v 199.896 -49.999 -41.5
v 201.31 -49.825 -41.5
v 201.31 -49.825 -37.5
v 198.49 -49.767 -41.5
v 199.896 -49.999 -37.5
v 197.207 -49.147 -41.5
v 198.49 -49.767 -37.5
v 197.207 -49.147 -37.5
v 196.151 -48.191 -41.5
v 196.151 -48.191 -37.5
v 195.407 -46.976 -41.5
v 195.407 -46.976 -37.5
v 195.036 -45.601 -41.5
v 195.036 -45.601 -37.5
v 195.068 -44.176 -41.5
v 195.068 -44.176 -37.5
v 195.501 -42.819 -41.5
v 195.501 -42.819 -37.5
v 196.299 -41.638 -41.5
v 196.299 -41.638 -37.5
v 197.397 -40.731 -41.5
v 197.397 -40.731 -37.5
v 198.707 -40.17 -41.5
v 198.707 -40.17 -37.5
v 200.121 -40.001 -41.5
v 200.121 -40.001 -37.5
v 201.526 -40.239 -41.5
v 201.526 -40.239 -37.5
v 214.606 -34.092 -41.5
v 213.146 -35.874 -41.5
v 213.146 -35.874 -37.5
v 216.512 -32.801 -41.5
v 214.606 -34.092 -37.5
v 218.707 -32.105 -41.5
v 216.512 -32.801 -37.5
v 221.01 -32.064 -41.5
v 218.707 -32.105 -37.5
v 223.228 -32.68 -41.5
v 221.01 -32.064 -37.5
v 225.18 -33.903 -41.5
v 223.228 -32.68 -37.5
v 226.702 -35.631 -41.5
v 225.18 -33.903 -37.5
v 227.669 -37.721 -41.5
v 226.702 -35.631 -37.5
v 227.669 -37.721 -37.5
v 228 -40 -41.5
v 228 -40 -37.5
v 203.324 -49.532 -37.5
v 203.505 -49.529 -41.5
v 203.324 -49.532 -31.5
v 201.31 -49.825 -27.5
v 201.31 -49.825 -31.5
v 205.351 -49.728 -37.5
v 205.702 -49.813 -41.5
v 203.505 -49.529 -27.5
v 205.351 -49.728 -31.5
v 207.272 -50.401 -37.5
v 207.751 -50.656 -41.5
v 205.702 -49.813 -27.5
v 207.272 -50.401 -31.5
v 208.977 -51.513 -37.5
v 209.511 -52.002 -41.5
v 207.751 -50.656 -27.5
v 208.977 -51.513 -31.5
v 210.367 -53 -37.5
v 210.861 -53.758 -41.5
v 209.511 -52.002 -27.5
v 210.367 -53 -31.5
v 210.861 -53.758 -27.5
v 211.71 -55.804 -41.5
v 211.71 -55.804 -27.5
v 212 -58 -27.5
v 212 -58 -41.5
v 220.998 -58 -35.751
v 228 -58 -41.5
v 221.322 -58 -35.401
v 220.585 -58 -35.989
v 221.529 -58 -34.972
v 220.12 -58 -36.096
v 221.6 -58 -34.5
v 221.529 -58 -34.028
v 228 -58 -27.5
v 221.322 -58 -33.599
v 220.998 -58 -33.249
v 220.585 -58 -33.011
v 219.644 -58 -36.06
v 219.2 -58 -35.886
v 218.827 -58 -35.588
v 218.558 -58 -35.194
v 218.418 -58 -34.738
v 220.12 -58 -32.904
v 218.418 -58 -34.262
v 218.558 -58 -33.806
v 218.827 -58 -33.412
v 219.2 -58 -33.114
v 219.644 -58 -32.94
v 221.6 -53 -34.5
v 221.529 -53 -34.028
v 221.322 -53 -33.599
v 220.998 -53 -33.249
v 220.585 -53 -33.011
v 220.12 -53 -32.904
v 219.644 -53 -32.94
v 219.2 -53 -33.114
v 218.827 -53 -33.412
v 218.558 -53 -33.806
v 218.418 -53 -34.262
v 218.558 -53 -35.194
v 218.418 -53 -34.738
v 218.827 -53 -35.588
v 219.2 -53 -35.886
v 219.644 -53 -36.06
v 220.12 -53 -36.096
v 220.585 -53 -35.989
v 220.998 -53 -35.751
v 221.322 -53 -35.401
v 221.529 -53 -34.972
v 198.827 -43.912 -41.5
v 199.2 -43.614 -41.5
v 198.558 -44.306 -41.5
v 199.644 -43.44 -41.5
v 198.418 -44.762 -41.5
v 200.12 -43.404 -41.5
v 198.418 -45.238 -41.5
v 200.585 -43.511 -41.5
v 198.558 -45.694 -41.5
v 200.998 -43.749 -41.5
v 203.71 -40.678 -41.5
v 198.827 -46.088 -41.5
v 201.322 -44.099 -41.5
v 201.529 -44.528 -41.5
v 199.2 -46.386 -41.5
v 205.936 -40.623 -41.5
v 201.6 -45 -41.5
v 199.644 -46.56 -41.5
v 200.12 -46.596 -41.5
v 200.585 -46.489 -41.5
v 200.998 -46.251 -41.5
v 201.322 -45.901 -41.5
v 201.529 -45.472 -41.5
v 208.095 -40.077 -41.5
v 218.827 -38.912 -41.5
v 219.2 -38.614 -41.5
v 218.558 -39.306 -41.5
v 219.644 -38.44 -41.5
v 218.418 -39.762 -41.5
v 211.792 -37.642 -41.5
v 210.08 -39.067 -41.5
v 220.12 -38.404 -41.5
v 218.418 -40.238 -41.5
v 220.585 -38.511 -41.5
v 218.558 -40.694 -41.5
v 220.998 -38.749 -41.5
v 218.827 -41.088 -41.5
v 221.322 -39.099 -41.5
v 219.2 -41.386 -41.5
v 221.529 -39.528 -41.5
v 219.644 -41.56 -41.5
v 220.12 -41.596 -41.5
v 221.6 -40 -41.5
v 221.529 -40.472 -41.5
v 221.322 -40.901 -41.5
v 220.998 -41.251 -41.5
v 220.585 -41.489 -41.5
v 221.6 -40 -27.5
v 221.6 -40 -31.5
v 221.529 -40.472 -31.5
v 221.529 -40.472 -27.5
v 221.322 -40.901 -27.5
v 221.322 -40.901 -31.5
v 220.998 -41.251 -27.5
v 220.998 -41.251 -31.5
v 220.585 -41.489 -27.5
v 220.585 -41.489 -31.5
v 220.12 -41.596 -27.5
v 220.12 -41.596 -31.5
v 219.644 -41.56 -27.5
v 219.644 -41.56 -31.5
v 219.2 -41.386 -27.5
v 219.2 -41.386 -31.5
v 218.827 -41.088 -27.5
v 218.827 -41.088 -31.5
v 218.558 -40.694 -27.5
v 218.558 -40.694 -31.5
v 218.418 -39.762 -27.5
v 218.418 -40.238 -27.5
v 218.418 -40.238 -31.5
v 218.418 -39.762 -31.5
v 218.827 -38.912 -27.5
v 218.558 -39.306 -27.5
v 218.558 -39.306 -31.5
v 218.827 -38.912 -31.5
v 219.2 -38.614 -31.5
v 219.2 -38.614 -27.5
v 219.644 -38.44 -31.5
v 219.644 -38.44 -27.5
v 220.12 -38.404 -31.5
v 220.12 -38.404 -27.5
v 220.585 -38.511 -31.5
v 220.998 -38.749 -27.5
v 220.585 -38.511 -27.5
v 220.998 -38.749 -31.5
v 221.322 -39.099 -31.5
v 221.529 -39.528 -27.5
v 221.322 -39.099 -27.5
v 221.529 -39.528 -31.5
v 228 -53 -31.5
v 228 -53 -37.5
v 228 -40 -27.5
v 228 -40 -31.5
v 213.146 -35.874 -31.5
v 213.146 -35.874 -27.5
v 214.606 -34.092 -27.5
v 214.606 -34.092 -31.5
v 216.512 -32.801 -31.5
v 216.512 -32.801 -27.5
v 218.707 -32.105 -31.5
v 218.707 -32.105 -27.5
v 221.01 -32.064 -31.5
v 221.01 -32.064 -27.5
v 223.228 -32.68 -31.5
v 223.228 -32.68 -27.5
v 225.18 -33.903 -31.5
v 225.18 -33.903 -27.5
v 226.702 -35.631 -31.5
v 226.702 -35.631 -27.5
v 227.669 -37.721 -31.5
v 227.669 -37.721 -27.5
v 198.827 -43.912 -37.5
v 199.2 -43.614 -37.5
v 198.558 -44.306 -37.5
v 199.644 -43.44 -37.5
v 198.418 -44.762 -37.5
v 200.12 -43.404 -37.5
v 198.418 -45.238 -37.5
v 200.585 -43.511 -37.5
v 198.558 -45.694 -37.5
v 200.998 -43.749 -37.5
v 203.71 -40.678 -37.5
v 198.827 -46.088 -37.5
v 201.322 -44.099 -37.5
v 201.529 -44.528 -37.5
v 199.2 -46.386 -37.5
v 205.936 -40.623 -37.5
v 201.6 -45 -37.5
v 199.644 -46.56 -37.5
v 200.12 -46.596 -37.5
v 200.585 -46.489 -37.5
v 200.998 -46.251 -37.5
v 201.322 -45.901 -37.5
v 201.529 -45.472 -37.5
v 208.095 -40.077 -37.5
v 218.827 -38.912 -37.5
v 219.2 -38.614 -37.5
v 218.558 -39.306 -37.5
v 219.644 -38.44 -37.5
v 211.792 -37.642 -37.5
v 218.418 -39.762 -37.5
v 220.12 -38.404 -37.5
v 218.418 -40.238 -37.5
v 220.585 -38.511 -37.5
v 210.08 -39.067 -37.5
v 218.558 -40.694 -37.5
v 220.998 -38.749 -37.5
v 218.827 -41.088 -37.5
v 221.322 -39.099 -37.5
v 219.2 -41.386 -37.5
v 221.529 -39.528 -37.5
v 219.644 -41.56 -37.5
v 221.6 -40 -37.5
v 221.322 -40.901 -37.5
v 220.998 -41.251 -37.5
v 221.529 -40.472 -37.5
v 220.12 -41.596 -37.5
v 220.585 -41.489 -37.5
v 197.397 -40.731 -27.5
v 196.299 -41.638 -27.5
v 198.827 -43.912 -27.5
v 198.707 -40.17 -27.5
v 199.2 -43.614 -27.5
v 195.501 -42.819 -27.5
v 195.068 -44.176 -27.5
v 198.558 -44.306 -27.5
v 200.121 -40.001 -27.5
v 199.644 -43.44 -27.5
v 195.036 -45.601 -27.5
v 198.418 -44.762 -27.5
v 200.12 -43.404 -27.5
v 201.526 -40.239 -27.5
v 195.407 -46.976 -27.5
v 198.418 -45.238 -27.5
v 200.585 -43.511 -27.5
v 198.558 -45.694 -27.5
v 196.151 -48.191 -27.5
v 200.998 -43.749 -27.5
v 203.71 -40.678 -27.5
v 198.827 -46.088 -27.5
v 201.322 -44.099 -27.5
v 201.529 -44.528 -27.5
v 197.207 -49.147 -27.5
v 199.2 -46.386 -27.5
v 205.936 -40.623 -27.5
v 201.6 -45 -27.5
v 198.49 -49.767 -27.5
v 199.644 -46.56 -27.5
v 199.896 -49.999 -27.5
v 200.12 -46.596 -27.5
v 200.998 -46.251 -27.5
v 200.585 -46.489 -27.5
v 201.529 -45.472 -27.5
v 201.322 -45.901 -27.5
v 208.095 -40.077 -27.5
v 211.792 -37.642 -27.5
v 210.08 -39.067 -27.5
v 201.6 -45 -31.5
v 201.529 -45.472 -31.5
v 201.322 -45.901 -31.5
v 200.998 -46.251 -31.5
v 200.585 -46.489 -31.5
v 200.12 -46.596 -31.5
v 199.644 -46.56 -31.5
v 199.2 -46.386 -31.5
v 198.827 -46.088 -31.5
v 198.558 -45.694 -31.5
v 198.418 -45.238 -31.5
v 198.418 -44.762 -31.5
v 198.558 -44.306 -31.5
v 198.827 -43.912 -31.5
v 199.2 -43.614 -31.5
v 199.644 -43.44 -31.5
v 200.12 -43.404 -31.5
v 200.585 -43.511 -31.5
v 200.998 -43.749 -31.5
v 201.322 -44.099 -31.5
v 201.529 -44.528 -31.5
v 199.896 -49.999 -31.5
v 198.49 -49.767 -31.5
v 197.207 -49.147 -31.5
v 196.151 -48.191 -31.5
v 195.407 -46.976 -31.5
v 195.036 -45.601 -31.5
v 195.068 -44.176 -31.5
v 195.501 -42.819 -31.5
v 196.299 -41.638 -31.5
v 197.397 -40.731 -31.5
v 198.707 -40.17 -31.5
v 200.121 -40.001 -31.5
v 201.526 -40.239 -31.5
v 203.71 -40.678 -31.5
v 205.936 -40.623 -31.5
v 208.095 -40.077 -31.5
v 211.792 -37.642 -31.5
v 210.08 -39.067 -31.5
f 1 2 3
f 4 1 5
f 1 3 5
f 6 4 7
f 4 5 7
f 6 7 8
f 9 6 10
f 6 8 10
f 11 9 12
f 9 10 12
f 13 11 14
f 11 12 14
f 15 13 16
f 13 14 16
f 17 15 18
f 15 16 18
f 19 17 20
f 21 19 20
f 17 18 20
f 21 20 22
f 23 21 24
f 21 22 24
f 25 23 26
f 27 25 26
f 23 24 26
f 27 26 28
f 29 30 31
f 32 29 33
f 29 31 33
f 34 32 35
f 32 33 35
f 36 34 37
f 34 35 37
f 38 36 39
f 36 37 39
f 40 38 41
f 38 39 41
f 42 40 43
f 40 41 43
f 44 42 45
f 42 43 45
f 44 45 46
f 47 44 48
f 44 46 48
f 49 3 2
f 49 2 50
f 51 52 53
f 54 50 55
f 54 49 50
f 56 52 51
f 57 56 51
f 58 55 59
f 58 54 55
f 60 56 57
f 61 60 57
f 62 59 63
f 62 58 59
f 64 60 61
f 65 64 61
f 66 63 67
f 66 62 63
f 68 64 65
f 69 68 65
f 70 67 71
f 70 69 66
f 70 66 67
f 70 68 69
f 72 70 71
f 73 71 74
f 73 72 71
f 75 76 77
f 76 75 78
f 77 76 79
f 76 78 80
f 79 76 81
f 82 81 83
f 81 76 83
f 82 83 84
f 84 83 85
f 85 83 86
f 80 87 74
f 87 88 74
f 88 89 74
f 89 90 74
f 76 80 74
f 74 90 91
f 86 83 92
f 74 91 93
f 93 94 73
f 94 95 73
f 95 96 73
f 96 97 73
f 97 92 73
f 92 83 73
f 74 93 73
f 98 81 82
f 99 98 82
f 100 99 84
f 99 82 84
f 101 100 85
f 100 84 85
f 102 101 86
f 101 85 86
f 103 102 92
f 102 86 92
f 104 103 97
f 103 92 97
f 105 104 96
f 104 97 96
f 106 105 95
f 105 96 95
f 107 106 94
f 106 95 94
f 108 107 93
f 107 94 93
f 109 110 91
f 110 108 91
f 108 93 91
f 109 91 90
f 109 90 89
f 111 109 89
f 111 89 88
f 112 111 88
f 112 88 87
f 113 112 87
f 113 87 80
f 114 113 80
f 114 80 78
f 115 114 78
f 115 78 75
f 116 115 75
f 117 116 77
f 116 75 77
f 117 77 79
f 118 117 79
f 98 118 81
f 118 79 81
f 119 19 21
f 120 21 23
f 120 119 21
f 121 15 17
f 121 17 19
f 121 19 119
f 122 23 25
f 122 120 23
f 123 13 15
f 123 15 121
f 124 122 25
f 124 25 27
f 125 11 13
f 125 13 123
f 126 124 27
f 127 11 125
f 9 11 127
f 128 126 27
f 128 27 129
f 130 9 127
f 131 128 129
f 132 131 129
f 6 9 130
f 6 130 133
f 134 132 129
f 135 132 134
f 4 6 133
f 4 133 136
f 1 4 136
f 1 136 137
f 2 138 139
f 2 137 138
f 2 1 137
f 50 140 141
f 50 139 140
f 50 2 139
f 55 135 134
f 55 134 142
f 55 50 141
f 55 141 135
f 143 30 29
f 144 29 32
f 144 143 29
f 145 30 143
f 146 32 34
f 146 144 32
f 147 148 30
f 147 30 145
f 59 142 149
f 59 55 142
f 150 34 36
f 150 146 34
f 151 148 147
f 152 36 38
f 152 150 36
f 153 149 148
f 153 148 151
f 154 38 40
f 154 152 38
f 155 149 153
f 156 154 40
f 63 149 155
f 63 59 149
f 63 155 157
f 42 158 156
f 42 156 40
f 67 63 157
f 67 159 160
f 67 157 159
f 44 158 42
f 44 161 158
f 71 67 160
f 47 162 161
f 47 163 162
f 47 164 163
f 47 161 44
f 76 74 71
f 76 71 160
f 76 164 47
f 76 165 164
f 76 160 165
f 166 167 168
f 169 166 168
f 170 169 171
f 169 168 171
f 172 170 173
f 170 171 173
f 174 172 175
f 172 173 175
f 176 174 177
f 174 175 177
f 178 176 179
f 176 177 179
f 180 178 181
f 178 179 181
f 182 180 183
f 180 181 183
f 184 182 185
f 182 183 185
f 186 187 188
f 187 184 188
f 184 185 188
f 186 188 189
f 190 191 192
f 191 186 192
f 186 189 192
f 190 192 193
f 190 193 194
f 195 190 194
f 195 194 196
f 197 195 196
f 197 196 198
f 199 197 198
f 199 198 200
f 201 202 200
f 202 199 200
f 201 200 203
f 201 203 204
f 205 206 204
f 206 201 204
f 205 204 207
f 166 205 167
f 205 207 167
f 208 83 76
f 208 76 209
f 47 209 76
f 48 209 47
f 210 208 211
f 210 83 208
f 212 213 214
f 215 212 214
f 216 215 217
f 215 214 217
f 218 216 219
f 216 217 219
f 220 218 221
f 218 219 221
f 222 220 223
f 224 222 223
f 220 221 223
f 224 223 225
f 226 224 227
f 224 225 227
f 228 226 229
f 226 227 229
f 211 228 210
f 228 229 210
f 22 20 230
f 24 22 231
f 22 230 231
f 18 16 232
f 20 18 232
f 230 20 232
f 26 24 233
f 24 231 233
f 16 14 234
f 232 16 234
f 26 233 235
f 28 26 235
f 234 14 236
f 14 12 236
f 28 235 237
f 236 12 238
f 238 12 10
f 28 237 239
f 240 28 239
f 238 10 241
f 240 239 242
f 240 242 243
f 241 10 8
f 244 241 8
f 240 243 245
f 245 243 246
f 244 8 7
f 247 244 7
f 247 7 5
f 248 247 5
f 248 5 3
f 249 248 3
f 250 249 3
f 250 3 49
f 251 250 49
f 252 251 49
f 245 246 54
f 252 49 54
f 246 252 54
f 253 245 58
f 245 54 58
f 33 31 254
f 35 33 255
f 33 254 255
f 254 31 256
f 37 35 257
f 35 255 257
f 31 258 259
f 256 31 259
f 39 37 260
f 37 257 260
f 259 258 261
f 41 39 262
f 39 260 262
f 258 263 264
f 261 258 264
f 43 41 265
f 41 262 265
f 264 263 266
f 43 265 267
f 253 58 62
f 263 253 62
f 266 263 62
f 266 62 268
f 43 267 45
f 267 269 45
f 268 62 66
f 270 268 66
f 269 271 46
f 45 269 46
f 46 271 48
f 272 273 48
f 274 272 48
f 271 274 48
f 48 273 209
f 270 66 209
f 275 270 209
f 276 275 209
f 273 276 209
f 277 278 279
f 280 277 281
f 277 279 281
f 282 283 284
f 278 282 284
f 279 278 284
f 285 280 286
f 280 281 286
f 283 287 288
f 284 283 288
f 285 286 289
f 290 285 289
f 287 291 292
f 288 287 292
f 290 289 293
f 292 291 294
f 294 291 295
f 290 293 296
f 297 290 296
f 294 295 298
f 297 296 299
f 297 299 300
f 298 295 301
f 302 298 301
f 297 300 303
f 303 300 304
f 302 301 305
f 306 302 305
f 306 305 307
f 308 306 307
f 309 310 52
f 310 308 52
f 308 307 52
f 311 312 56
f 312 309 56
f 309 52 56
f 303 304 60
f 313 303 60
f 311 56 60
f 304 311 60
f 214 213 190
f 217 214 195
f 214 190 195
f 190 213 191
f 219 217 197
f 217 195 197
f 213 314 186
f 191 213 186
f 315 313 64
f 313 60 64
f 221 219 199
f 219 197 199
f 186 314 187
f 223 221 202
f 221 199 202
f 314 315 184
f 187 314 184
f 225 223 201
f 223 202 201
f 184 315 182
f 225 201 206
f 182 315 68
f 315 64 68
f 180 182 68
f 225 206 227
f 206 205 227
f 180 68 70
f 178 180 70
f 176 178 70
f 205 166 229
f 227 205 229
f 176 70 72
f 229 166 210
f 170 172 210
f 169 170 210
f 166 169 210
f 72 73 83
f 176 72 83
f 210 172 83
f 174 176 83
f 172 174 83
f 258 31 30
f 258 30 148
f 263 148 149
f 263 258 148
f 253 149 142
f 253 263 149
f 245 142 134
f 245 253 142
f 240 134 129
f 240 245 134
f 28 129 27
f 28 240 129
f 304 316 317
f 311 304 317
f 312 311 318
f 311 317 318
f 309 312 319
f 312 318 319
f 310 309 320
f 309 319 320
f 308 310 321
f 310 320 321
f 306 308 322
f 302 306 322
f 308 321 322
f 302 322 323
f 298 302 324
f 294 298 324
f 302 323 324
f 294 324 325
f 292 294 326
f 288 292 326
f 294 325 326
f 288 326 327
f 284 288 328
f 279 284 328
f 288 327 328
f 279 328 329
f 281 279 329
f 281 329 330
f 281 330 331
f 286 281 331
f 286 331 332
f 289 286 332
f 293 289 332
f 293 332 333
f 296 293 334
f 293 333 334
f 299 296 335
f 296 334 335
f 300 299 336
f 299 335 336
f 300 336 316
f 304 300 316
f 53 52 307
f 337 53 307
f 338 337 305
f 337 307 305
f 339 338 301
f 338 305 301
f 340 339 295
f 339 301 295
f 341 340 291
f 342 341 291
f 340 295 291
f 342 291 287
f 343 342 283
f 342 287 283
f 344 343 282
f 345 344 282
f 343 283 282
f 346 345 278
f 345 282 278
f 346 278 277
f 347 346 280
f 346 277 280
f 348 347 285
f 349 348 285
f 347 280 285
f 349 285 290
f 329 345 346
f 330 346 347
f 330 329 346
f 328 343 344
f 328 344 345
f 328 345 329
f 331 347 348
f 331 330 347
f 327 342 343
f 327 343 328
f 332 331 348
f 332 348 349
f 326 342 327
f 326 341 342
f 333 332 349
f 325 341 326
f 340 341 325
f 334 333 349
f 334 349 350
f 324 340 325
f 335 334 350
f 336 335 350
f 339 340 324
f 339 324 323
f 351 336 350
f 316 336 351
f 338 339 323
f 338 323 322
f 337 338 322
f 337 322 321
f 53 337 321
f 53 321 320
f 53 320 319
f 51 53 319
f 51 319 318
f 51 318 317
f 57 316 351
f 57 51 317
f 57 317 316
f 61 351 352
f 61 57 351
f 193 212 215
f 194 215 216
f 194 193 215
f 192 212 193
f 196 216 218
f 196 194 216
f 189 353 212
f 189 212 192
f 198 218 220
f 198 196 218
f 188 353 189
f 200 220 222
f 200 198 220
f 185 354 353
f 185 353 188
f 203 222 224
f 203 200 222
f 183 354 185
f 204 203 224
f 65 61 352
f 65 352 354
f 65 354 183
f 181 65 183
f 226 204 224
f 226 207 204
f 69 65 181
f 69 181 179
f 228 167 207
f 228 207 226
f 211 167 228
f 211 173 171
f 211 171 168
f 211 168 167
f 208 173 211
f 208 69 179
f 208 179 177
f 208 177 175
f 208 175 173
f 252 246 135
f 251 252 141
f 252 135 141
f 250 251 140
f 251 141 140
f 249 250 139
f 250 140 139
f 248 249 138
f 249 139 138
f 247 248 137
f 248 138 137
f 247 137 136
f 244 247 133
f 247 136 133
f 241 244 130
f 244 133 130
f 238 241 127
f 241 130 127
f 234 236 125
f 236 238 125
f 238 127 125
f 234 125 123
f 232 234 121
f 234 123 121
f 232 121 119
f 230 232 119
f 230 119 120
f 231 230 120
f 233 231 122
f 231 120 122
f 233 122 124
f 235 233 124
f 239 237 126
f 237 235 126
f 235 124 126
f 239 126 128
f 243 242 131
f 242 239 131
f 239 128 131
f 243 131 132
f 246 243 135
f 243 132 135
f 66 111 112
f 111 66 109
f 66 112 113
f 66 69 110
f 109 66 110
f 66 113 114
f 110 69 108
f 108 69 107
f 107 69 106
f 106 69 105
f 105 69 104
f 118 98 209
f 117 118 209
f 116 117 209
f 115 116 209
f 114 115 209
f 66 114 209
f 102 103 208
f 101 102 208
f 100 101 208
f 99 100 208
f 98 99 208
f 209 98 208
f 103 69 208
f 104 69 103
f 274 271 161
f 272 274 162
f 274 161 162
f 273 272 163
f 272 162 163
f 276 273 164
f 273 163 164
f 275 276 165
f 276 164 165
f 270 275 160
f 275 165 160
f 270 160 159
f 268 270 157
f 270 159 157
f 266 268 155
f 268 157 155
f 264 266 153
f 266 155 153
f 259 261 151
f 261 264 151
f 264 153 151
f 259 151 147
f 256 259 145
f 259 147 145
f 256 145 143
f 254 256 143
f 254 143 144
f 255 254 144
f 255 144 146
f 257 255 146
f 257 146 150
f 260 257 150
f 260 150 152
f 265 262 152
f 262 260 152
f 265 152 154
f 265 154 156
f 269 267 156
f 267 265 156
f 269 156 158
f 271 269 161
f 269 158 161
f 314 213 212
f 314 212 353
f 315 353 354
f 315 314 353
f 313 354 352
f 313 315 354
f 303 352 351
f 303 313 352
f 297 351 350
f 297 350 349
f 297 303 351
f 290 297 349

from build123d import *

# Parameters (mm, degrees)
CYLINDER024_R          = 1.6
CYLINDER024_DEPTH      = 23
CYLINDER010_R          = 1.6
CYLINDER010_DEPTH      = 200
CYLINDER010_ROLL_ANGLE = 90
SKETCH006_W            = 50
SKETCH006_H            = 50
PAD009_DEPTH           = 3
SKETCH005_R            = 1.6
PAD008_DEPTH           = 7


with BuildPart() as cilindro024:
    # Cylinder024 → Cylinder024 (new body)
    with BuildSketch(Plane(origin=(220, 40, -41.5), x_dir=(1, 0, 0), z_dir=(0, 0, 1))):
        Circle(CYLINDER024_R)
    extrude(amount=CYLINDER024_DEPTH)


with BuildPart() as cilindro010:
    # Cylinder010 → Cylinder010 (new body)
    with BuildSketch(Plane.XY):
        Circle(CYLINDER010_R)
    extrude(amount=CYLINDER010_DEPTH)


with BuildPart() as cilindro010_1:
    # Cylinder010 roll: moved
    add(cilindro010.part.rotate(Axis((0, 0, 0), (1, 0, 0)), CYLINDER010_ROLL_ANGLE))


with BuildPart() as cilindro010_2:
    # Cylinder010 placement: moved
    add(cilindro010_1.part.moved(Location((220, 100, -34.5))))


with BuildPart() as pad009:
    # Sketch006 → Pad009 (new body, symmetric)
    with BuildSketch(Plane.XY):
        with Locations((203, 28)):
            Rectangle(SKETCH006_W, SKETCH006_H)
    extrude(amount=PAD009_DEPTH, both=True)


with BuildPart() as cut020:
    # Sketch005 → Pad008 (new body, symmetric)
    with BuildSketch(Plane.XY):
        with BuildLine():
            ThreePointArc((213.146217, 35.873783), (222.141241, 32.291882), (228, 40.000021))
            Line((228, 58.000021), (228, 40.000021))
            Line((228, 58.000021), (212, 58.000021))
            ThreePointArc((201.31003, 49.825331), (208.674868, 51.271332), (212, 58.000021))
            ThreePointArc((201.31003, 49.825331), (195.001272, 44.887217), (201.526329, 40.238664))
            ThreePointArc((213.146217, 35.873783), (208.095475, 40.07732), (201.526329, 40.238664))
        make_face()
        with Locations((200, 45)):
            Circle(SKETCH005_R, mode=Mode.SUBTRACT)
    extrude(amount=PAD008_DEPTH, both=True)

    # Cut005: cut Pad009
    add(pad009.part, mode=Mode.SUBTRACT)


with BuildPart() as cut020_1:
    # Cut005 placement: moved
    add(cut020.part.moved(Location((0, 0, -34.5))))

    # Cut006: cut Cilindro010
    add(cilindro010_2.part, mode=Mode.SUBTRACT)

    # Cut020: cut Cilindro024
    add(cilindro024.part, mode=Mode.SUBTRACT)


with BuildPart() as part_mirroring:
    # Part__Mirroring: instance of Cut020
    add(cut020_1.part.mirror(Plane(origin=(0, 0, 0), x_dir=(1, 0, 0), z_dir=(0, 1, 0))))


solid = part_mirroring.part
